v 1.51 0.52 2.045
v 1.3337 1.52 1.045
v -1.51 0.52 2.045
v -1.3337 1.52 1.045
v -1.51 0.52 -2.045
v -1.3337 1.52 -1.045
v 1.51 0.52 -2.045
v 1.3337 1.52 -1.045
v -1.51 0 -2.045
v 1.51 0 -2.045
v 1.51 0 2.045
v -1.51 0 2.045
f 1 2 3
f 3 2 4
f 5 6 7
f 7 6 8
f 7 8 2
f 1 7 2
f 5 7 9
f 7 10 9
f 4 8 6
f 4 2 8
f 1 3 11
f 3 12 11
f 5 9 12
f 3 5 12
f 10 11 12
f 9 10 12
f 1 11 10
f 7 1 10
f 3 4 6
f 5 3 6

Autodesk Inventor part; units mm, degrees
ref_plane "YZ Plane" through (0, 0, 0) normal (1, 0, 0) x (0, 1, 0)
ref_plane "XZ Plane" through (0, 0, 0) normal (0, 1, 0) x (-1, 0, 0)
ref_plane "XY Plane" through (0, 0, 0) normal (0, 0, 1) x (1, 0, 0)
sketch "Sketch1" plane through (0, 0, 0) normal (0, 1, 0) x (-1, 0, 0)
  line L0 (1.51, 2.045) -> (-1.51, 2.045)
  line L1 (-1.51, 2.045) -> (-1.51, -2.045)
  line L2 (-1.51, -2.045) -> (1.51, -2.045)
  line L3 (1.51, -2.045) -> (1.51, 2.045)
  point P0 (0, 0)
  dimension "d0" = 1.51
  dimension "d1" = 1.51
  dimension "d2" = 2.045
  dimension "d3" = 2.045
extrude "Extrusion1" add sketch "Sketch1" along normal blind 1.52
chamfer "Chamfer1" distance 1 angle 45 2 edges at (0, 1.52, 2.045) (0, 1.52, -2.045) measured on face at (0.5033, 1.52, 0.6817)
chamfer "Chamfer2" distance 1 angle 10 1 edges at (-1.51, 1.52, 0) measured on face at (-1.51, 0.5067, -0.3483)
chamfer "Chamfer3" distance 1 angle 10 1 edges at (1.51, 1.52, 0) measured on face at (1.51, 0.5067, 0.3483)
equation "\"d1\" = d0"
equation "\"d3\" = d2"
properties part number "Sensor"
